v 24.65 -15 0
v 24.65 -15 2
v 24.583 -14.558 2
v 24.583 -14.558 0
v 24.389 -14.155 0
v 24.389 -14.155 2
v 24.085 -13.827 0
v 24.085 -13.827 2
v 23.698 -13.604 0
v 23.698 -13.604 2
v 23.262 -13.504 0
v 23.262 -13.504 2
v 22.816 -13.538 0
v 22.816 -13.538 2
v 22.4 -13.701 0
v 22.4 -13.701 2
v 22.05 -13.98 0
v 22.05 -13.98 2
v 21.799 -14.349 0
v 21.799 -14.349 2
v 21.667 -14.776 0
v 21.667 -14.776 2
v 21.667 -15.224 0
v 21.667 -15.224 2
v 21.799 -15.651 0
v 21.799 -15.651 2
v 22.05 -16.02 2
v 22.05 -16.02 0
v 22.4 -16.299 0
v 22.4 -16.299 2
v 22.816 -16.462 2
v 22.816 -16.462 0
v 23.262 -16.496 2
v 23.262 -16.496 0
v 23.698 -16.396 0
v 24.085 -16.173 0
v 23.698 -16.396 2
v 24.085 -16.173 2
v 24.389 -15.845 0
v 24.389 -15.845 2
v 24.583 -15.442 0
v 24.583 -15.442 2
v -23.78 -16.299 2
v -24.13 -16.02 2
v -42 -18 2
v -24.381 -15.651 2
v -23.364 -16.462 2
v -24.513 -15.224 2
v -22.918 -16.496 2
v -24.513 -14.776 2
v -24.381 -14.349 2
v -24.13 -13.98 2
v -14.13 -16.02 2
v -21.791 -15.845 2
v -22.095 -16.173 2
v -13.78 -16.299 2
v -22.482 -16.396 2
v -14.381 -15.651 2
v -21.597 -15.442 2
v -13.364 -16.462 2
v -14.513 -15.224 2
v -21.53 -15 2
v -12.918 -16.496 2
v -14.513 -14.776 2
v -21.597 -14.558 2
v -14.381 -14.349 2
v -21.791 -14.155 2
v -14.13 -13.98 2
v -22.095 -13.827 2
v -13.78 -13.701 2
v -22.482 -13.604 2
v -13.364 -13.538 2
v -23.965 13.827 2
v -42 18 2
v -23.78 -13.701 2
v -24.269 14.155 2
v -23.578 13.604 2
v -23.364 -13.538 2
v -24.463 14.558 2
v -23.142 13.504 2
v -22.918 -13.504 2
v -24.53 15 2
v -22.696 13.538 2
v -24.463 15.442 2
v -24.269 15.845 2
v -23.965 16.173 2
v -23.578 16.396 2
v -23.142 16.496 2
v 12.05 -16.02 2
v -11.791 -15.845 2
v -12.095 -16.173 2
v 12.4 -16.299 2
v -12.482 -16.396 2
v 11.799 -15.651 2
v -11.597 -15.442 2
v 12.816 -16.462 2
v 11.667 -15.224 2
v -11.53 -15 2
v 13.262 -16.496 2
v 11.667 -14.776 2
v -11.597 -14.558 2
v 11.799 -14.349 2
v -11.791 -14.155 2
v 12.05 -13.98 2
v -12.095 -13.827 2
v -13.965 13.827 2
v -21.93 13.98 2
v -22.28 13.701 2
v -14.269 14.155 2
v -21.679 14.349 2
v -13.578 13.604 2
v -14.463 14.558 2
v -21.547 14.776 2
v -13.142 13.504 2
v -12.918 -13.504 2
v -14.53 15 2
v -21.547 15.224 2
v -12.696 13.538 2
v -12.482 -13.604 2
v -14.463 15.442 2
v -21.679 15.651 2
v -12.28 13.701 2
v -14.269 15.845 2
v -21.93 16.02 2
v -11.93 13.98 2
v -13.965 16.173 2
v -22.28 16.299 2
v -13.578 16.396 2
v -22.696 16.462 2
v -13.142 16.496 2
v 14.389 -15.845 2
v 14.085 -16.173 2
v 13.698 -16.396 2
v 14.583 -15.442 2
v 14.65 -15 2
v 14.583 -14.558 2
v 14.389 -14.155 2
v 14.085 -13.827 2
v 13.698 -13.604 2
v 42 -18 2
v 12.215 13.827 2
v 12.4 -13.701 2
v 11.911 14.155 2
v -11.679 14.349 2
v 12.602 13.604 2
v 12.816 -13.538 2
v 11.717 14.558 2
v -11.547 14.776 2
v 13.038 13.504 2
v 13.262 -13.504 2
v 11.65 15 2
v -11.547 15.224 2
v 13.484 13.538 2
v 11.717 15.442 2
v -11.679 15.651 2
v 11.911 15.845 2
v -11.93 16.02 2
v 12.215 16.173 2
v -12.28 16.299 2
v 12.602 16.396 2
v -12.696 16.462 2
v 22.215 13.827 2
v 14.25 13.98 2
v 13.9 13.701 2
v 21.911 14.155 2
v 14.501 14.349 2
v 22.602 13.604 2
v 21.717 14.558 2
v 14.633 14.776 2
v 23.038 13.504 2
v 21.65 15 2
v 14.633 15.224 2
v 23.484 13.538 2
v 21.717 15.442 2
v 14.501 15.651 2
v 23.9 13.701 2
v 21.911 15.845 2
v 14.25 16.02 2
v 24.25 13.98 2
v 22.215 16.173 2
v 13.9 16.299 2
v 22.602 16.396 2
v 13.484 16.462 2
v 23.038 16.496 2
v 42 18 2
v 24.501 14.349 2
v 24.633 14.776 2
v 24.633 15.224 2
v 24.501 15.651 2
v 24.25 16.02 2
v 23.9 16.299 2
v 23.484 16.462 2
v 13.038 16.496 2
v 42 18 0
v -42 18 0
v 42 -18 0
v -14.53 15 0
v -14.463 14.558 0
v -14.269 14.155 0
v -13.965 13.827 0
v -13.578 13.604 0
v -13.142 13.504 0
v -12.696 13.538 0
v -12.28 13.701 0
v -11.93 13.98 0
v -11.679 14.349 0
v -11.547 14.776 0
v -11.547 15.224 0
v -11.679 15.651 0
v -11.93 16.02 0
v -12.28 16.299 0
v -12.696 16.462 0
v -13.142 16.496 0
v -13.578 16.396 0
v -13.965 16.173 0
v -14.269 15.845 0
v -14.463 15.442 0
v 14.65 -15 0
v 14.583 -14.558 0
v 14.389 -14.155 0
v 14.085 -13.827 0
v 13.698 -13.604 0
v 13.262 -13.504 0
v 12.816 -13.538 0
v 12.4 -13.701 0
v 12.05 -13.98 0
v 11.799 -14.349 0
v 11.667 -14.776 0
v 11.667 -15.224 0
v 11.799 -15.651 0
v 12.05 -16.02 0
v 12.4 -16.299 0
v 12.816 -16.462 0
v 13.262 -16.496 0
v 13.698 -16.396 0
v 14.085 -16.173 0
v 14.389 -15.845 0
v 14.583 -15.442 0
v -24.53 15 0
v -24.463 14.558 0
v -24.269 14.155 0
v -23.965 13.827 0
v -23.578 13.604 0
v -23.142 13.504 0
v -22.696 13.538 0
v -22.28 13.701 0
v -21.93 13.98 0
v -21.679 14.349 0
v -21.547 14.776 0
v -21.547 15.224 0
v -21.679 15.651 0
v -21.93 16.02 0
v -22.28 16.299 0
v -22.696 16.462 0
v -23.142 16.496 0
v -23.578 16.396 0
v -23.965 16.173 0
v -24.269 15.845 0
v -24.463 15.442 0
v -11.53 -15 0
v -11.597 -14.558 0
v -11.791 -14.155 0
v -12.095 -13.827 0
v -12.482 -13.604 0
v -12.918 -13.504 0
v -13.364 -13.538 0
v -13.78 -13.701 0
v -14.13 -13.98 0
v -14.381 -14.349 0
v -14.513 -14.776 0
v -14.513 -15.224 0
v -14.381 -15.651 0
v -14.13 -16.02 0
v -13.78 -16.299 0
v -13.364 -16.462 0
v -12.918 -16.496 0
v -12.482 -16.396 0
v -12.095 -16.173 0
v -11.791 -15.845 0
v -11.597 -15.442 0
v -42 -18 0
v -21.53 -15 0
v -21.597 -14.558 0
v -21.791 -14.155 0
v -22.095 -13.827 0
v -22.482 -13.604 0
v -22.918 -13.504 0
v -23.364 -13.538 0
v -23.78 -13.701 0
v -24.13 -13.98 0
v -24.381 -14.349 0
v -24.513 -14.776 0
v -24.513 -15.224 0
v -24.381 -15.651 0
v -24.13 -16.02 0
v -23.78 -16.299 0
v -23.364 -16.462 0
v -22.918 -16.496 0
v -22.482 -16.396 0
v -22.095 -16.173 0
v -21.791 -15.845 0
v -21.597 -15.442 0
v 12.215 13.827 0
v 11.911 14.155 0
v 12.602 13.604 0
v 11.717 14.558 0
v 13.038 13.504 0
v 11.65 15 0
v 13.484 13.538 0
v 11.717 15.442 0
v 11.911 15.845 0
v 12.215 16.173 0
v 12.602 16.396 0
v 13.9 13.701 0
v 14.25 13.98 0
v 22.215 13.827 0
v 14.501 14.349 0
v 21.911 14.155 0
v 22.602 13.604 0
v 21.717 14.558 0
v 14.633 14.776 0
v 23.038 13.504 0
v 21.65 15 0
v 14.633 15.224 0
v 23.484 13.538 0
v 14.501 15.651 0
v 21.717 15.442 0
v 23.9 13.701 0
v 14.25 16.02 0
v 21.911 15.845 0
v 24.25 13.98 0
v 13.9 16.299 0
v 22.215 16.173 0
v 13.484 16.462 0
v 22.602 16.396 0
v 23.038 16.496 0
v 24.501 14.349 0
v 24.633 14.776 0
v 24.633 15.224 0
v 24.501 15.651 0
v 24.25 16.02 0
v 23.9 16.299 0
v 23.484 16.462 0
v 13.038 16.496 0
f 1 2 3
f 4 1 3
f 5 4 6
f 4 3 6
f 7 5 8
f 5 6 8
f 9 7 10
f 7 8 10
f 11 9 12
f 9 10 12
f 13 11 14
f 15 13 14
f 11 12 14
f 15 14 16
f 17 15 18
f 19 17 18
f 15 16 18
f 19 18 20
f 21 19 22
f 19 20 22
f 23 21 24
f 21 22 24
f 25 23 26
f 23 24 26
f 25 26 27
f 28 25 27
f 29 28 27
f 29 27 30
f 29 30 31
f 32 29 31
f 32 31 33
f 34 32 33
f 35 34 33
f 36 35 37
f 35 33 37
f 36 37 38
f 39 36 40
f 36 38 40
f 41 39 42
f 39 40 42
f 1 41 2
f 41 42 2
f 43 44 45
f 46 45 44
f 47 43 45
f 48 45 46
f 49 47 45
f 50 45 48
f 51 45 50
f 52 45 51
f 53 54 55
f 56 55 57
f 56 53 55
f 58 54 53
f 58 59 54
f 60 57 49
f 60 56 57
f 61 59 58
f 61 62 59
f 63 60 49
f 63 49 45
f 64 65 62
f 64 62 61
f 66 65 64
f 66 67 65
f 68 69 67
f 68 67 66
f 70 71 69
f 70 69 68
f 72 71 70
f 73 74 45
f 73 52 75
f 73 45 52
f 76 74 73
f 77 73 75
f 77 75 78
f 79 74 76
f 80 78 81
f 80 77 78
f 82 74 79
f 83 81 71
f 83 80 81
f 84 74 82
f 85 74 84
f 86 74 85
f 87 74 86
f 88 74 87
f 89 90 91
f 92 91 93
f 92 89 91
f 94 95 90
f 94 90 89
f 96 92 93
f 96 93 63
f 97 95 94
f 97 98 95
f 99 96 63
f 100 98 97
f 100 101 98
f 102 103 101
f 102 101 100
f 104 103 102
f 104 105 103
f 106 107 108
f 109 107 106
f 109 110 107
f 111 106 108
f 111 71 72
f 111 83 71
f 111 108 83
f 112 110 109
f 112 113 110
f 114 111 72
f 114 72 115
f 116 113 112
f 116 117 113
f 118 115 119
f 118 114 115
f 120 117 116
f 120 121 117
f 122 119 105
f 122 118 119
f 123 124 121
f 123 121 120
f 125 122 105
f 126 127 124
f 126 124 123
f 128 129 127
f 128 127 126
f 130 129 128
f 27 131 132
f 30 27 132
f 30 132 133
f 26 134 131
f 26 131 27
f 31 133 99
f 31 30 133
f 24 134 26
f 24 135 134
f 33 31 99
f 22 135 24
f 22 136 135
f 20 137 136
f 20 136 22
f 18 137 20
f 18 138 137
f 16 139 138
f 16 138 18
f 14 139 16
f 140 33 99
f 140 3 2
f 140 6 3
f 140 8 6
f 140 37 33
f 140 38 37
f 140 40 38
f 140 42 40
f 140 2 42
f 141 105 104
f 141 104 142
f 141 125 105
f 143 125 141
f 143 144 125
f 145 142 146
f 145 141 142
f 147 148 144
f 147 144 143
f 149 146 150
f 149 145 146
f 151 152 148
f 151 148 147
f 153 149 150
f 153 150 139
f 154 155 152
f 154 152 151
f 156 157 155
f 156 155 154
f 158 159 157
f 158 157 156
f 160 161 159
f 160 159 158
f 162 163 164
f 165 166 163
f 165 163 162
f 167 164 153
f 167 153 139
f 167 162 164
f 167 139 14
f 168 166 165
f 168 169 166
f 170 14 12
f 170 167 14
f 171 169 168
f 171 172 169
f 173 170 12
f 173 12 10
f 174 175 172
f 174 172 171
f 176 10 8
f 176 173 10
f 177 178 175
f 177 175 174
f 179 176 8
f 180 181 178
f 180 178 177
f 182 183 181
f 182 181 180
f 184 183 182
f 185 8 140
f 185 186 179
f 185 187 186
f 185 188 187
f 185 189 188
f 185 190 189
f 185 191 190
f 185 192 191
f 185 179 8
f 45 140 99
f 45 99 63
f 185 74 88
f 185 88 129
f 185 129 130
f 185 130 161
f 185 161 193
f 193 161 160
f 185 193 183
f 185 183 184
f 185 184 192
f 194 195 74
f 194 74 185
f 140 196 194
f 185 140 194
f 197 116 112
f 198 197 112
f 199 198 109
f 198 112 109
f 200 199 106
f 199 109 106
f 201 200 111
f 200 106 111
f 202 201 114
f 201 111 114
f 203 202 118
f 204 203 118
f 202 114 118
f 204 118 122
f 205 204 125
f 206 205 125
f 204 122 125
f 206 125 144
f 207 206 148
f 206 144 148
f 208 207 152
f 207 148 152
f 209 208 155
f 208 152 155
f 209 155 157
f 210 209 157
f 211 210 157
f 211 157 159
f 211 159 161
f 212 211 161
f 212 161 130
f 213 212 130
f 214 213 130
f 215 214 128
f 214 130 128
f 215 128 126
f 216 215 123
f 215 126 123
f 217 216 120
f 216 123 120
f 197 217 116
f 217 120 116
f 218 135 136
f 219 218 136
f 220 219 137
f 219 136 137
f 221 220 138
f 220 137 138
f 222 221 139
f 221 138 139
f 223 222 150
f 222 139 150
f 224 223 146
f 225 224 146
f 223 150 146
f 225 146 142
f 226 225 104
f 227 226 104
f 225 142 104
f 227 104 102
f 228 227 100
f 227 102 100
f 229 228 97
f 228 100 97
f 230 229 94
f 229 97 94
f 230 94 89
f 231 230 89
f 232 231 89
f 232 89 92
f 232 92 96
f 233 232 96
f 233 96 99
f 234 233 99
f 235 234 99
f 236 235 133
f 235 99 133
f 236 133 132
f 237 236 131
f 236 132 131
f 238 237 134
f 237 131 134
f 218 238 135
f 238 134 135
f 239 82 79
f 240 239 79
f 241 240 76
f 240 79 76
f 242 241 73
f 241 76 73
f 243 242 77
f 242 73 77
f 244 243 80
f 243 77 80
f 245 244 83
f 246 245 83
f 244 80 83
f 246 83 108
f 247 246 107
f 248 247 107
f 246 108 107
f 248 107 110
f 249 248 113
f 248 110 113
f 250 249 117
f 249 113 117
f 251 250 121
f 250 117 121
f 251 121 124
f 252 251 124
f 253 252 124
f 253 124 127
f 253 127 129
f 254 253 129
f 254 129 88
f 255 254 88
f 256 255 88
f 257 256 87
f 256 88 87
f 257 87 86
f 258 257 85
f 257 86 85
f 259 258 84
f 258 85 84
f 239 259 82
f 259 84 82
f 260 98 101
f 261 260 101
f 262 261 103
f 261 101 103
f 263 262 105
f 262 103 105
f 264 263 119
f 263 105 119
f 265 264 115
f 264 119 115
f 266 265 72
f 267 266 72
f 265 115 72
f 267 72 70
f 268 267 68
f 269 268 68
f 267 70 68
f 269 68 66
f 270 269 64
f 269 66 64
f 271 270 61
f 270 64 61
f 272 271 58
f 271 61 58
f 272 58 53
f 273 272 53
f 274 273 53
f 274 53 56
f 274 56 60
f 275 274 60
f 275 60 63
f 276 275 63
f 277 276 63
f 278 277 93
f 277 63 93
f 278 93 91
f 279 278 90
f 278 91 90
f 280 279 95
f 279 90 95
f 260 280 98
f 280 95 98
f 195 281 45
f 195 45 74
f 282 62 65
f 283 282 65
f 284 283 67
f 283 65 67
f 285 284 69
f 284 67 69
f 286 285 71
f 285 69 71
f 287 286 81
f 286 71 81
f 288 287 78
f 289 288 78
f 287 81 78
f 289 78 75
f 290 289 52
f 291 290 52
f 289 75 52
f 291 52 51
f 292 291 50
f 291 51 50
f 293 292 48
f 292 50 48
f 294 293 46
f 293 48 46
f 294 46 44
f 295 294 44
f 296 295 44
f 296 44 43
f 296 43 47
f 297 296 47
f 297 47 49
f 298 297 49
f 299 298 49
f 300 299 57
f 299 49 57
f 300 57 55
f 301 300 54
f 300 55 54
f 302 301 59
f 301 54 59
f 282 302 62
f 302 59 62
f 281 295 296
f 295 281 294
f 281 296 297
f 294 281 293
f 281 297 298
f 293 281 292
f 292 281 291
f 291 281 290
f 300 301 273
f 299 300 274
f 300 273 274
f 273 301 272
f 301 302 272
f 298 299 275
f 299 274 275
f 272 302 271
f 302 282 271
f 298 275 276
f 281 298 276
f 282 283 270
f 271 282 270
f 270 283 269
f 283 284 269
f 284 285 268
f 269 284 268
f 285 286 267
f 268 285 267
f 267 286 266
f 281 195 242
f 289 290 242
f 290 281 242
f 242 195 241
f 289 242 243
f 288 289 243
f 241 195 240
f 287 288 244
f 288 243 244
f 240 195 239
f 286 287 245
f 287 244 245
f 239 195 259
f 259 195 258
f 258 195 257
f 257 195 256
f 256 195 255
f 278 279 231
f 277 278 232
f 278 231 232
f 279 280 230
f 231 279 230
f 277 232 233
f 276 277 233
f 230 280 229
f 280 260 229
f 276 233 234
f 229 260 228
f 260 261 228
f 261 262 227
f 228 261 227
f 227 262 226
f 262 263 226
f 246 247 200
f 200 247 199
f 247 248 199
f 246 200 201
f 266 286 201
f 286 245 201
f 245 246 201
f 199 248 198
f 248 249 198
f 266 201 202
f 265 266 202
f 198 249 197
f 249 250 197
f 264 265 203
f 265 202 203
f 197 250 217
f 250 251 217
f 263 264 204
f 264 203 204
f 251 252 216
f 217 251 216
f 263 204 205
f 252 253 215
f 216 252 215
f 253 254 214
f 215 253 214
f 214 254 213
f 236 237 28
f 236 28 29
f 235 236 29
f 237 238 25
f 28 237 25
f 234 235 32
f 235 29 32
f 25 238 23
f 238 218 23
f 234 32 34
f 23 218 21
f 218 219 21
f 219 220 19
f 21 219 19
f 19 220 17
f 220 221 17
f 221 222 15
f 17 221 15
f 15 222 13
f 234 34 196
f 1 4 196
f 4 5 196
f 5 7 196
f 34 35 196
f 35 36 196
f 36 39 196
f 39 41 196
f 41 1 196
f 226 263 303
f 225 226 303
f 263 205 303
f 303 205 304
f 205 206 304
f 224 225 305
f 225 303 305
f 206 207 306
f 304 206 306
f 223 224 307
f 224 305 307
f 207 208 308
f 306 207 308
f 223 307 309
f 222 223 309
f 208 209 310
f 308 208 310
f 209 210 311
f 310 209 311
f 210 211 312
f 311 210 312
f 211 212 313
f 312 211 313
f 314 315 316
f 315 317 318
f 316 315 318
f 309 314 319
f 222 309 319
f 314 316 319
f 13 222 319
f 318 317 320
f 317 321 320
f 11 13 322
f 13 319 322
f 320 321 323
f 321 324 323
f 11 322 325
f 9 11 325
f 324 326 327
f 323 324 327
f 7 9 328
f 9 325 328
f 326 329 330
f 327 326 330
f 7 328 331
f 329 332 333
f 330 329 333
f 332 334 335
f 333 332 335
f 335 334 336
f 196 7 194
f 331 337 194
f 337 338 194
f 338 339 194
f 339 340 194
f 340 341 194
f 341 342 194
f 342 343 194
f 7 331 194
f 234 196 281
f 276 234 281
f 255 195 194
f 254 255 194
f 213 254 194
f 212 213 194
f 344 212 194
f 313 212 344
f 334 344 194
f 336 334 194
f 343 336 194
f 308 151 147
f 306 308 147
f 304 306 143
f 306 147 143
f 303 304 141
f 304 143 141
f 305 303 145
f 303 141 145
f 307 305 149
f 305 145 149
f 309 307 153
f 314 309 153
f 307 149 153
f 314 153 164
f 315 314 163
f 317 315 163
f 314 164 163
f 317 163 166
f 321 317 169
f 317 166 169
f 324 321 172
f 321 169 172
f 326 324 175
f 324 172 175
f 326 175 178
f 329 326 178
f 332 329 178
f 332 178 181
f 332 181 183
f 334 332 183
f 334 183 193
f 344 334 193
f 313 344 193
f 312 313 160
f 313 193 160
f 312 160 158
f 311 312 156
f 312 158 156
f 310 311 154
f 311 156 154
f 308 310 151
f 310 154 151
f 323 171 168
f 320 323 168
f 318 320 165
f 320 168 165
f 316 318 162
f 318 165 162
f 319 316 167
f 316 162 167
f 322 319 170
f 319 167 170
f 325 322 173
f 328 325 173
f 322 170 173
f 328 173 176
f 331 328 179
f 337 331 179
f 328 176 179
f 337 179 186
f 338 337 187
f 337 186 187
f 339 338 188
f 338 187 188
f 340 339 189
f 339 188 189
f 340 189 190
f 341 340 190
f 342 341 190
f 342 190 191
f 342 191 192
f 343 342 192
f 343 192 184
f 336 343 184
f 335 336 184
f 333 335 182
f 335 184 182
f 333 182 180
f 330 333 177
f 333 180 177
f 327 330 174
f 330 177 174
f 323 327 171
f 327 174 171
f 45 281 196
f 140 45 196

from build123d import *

# Parameters (mm, degrees)
SKETCH_1_W          = 84
SKETCH_1_H          = 36
EXTRUDE_1_DEPTH     = 2
SKETCH_2_R          = 1.5
CUT_EXTRUDE_1_DEPTH = 2


with BuildPart() as part:
    # 草图1 → 凸台-拉伸1 (new body)
    with BuildSketch(Plane.XY):
        Rectangle(SKETCH_1_W, SKETCH_1_H)
    extrude(amount=EXTRUDE_1_DEPTH)

    # 草图2 → 切除-拉伸1 (cut)
    with BuildSketch(Plane.XY.offset(2)):
        with Locations((23.15, -15)):
            Circle(SKETCH_2_R)
        with Locations((13.15, -15)):
            Circle(SKETCH_2_R)
        with Locations((-13.03, -15)):
            Circle(SKETCH_2_R)
        with Locations((-23.03, -15)):
            Circle(SKETCH_2_R)
        with Locations(Location((-23.03, 15, 0), (0, 0, 180))):
            Circle(SKETCH_2_R)
        with Locations(Location((-13.03, 15, 0), (0, 0, 180))):
            Circle(SKETCH_2_R)
        with Locations(Location((13.15, 15, 0), (0, 0, 180))):
            Circle(SKETCH_2_R)
        with Locations(Location((23.15, 15, 0), (0, 0, 180))):
            Circle(SKETCH_2_R)
    extrude(amount=-CUT_EXTRUDE_1_DEPTH, mode=Mode.SUBTRACT)


solid = part.part
